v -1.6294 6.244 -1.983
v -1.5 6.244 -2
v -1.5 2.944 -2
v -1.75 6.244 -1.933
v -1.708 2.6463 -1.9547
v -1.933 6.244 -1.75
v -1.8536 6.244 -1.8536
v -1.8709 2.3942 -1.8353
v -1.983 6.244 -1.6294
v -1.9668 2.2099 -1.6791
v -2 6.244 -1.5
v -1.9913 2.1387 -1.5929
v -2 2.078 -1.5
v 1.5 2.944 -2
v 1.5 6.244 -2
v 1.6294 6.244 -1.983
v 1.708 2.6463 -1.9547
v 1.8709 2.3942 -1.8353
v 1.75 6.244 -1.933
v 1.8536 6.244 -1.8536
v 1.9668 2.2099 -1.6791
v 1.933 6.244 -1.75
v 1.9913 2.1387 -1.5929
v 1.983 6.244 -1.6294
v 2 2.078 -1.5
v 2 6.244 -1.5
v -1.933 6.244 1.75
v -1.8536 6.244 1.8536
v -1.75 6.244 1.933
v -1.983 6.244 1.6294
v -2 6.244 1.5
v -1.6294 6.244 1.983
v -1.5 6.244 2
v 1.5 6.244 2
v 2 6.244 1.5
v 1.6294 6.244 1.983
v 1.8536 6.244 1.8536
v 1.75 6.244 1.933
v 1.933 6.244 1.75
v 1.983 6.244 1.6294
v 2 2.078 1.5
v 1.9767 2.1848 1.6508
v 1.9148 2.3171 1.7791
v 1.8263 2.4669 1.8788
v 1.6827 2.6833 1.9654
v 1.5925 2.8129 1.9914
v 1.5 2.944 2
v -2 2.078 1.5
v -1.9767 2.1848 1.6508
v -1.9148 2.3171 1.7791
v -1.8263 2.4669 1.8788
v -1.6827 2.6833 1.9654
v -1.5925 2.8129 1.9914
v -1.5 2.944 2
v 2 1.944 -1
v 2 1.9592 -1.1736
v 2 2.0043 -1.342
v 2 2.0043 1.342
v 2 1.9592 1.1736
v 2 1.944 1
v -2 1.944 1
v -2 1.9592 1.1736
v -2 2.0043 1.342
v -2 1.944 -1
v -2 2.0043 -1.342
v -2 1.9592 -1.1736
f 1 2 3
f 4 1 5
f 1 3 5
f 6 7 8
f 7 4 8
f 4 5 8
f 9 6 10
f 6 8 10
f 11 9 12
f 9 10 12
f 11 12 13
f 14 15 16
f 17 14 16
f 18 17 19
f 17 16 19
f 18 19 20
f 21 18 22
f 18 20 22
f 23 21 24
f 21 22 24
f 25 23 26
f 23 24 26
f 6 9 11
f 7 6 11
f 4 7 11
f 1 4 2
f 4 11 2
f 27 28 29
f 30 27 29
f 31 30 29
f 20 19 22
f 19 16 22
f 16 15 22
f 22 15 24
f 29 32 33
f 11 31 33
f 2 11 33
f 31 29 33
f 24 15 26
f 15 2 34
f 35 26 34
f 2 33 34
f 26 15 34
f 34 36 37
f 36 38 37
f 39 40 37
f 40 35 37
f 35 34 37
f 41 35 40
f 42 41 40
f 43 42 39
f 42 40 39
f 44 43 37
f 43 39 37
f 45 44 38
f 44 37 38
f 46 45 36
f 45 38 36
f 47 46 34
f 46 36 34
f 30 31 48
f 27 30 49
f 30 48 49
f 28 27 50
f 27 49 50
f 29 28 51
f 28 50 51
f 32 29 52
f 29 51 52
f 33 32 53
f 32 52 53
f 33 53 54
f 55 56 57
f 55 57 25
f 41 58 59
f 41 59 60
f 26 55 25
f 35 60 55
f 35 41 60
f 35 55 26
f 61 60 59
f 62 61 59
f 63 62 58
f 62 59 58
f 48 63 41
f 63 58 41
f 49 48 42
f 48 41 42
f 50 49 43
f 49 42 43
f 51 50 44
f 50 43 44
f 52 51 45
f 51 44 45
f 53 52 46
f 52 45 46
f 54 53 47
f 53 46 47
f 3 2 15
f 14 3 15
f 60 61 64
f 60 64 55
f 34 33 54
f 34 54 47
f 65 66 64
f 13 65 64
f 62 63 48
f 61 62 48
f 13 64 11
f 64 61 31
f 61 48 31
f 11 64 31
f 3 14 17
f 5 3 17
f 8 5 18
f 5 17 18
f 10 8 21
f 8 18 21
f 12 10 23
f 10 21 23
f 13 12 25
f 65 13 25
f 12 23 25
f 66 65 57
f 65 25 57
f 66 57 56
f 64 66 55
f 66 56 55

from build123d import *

# Parameters (mm, degrees)
SKETCH1_W           = 4
SKETCH1_H           = 4.3
BOSS_EXTRUDE1_DEPTH = 2
FILLET1_R           = 0.5
FILLET2_R           = 1


with BuildPart() as part:
    # Sketch1 → Boss-Extrude1 (new, symmetric)
    with BuildSketch(Plane.XY):
        with Locations((0, 4.094)):
            Rectangle(SKETCH1_W, SKETCH1_H)
    extrude(amount=BOSS_EXTRUDE1_DEPTH, both=True)

    # Fillet1
    # the kernel refuses this fillet: 0.5 mm, written as the material it takes off along each edge
    with BuildSketch(Plane(origin=(2, 7.494, 2), x_dir=(-1, 0, 0), z_dir=(0, -1, 0)), Plane(origin=(-2, 0.694, 2), x_dir=(1, 0, 0), z_dir=(0, 1, 0)), Plane(origin=(2, 7.494, -2), x_dir=(0, 0, 1), z_dir=(0, -1, 0))) as fillet1_piece_1:
        with BuildLine():
            CenterArc((FILLET1_R, FILLET1_R), FILLET1_R, 180, 90)
            Line((0, FILLET1_R), (-FILLET1_R * 0.02, FILLET1_R))
            Line((-FILLET1_R * 0.02, FILLET1_R), (-FILLET1_R * 0.02, -FILLET1_R * 0.02))
            Line((-FILLET1_R * 0.02, -FILLET1_R * 0.02), (FILLET1_R, -FILLET1_R * 0.02))
            Line((FILLET1_R, -FILLET1_R * 0.02), (FILLET1_R, 0))
        make_face()
    extrude(amount=6.8, mode=Mode.SUBTRACT)
    with BuildSketch(Plane(origin=(-2, 0.694, -2), x_dir=(1, 0, 0), z_dir=(0, 1, 0))) as fillet1_piece_2:
        with BuildLine():
            CenterArc((FILLET1_R, -FILLET1_R), FILLET1_R, 90, 90)
            Line((0, -FILLET1_R), (-FILLET1_R * 0.02, -FILLET1_R))
            Line((-FILLET1_R * 0.02, -FILLET1_R), (-FILLET1_R * 0.02, FILLET1_R * 0.02))
            Line((-FILLET1_R * 0.02, FILLET1_R * 0.02), (FILLET1_R, FILLET1_R * 0.02))
            Line((FILLET1_R, FILLET1_R * 0.02), (FILLET1_R, 0))
        make_face()
    extrude(amount=6.8, mode=Mode.SUBTRACT)

    # Fillet2
    # the kernel refuses this fillet: 1 mm, written as the material it takes off along each edge
    with BuildSketch(Plane(origin=(4, 1.944, 2), x_dir=(0, 1, 0), z_dir=(-1, 0, 0))) as fillet2_piece_1:
        with BuildLine():
            CenterArc((FILLET2_R, FILLET2_R), FILLET2_R, 180, 90)
            Line((0, FILLET2_R), (0, 0))
            Line((0, 0), (FILLET2_R, 0))
        make_face()
    extrude(amount=8, mode=Mode.SUBTRACT)
    with BuildSketch(Plane(origin=(4, 1.944, -2), x_dir=(0, 1, 0), z_dir=(-1, 0, 0))) as fillet2_piece_2:
        with BuildLine():
            CenterArc((FILLET2_R, -FILLET2_R), FILLET2_R, 90, 90)
            Line((0, -FILLET2_R), (0, 0))
            Line((0, 0), (FILLET2_R, 0))
        make_face()
    extrude(amount=8, mode=Mode.SUBTRACT)


solid = part.part
